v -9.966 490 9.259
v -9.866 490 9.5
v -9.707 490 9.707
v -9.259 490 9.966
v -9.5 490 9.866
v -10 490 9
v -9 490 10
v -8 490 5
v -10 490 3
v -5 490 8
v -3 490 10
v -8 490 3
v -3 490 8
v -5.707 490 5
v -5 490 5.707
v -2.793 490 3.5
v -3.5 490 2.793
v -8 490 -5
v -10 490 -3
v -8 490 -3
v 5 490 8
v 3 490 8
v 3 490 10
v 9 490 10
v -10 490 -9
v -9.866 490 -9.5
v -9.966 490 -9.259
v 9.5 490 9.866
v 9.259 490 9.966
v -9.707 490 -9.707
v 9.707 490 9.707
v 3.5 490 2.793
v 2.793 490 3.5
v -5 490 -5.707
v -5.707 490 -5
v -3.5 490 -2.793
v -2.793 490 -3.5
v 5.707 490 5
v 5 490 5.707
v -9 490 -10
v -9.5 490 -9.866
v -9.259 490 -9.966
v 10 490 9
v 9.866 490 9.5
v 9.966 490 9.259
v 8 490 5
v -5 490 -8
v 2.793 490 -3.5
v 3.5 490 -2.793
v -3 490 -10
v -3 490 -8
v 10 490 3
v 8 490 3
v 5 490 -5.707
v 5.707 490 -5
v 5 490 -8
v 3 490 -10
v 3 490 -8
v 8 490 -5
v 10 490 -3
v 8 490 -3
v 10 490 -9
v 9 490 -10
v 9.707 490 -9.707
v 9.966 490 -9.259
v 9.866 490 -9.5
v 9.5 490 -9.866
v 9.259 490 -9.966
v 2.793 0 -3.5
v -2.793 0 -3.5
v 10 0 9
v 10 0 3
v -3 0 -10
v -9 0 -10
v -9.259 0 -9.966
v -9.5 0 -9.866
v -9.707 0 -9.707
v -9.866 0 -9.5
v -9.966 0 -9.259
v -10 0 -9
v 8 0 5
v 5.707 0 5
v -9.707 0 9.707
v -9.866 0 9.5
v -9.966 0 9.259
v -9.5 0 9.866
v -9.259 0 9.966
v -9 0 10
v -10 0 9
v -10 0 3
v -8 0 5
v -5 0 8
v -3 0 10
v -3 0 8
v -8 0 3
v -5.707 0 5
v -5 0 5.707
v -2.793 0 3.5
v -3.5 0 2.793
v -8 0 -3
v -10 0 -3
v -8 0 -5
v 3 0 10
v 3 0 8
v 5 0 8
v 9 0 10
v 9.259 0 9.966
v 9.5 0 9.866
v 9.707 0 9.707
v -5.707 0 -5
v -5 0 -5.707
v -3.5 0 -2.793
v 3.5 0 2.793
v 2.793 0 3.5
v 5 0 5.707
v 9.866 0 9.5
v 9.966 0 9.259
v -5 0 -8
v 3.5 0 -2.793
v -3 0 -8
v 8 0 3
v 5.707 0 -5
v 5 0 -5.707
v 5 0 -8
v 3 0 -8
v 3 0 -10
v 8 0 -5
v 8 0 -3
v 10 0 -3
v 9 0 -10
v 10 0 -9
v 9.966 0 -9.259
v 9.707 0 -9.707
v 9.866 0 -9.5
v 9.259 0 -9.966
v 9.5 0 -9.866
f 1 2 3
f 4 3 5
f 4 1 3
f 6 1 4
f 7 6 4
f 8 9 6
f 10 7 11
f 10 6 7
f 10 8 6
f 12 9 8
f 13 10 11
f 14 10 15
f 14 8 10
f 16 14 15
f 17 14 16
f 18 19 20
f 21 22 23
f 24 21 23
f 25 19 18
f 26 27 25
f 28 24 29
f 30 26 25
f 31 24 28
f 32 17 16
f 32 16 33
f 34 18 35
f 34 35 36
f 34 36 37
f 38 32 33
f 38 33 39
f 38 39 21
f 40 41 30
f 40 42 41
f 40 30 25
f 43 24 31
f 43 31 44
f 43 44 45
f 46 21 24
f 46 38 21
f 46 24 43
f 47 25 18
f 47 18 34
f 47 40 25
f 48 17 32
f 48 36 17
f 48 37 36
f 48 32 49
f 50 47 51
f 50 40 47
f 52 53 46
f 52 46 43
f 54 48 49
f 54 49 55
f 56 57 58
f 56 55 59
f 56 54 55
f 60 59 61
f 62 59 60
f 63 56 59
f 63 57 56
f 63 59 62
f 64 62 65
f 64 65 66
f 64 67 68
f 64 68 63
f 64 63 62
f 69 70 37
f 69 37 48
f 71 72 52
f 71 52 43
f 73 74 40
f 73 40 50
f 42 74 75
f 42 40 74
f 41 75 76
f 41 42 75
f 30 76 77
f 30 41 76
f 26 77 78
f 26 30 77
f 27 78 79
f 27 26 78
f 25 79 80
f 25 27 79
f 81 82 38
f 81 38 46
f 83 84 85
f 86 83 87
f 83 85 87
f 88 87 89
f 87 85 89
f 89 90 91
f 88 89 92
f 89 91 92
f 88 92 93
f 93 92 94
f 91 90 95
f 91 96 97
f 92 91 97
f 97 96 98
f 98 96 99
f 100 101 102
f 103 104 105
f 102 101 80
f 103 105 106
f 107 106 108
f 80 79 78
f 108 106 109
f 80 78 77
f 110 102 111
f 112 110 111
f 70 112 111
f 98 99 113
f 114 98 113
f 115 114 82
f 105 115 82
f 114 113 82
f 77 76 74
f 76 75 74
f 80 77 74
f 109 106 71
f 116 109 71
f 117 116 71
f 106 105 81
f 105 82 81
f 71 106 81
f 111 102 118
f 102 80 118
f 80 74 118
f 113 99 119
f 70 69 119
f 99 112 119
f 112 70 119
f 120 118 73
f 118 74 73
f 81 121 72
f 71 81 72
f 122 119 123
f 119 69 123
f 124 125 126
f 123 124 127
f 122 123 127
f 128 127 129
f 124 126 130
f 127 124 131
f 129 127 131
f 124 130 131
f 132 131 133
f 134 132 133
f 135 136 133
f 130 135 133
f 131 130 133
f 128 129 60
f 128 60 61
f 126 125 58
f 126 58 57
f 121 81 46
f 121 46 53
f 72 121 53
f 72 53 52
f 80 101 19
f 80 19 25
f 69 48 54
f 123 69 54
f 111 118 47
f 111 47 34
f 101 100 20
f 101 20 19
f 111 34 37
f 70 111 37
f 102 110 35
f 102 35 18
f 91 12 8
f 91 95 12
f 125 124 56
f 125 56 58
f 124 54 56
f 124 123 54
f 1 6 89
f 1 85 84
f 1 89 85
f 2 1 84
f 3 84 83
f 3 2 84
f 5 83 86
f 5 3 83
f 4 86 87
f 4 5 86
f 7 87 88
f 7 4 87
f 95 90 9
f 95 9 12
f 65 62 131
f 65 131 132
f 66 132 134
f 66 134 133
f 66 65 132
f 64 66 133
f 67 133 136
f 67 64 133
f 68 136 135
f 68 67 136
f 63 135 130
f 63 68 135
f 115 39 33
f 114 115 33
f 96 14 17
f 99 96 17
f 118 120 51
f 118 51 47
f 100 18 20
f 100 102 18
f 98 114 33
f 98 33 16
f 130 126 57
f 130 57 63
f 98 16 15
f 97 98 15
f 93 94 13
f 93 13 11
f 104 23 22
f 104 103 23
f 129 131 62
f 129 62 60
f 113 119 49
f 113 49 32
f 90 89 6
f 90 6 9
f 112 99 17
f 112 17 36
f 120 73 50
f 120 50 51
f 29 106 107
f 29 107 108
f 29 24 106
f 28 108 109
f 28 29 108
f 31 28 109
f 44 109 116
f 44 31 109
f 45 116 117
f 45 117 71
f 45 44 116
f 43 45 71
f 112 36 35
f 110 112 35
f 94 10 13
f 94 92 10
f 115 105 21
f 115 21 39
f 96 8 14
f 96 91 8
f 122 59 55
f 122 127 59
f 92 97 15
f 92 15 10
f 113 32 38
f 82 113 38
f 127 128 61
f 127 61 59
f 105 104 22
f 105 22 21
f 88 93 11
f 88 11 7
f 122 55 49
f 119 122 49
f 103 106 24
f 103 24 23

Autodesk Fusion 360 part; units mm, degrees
sketch "Sketch1" plane through (0, 0, 0) normal (0, 1, 0) x (1, 0, 0)
  line L0 (3.5, 0) -> (3.5, -2.7929)
  line L1 (3.5, -2.7929) -> (5.7071, -5)
  line L2 (5.7071, -5) -> (8, -5)
  line L3 (10, -3) -> (10, -10)
  line L4 (0, 0) -> (10, -10)
  line L5 (3.5, 0) -> (0, 0)
  line L6 (8, -5) -> (8, -3)
  line L7 (8, -3) -> (10, -3)
  dimension "d4" = 45
  dimension "d5" = 0.5
  dimension "d7" = 7
  dimension "d8" = 2
  dimension "d9" = 2
  dimension "d10" = 3.5
  dimension "d11" = 10
extrude "Extrude1" add sketch "Sketch1" along normal blind 490
mirror "Mirror1" about plane through (0, 0, 0) normal (-0.707107, 0, 0.707107) of bodies 1 merged
mirror "Mirror2" about plane through (0, 0, 3.5) normal (-1, 0, 0) of bodies 1 merged
mirror "Mirror3" about plane through (3.5, 0, 0) normal (0, 0, -1) of bodies 1 merged
fillet "Fillet1" radius 1 4 edges at (-10, 245, 10) (10, 245, 10) (-10, 245, -10) (10, 245, -10)
sketch "Sketch2" plane through (0, 0, 0) normal (0, -1, 0) x (1, 0, 0)
  arc A0 (9, -10) -> (10, -9) centre (9, -9) ccw
  line L0 (10, -9) -> (10, -3)
  line L1 (10, -3) -> (8, -3)
  line L2 (8, -3) -> (8, -5)
  line L3 (8, -5) -> (5.7071, -5)
  line L4 (5.7071, -5) -> (3.5, -2.7929)
  line L5 (3.5, -2.7929) -> (3.5, 2.7929)
  line L6 (3.5, 2.7929) -> (5.7071, 5)
  line L7 (5.7071, 5) -> (8, 5)
  line L8 (8, 5) -> (8, 3)
  line L9 (8, 3) -> (10, 3)
  line L10 (10, 3) -> (10, 9)
  arc A1 (10, 9) -> (9, 10) centre (9, 9) ccw
  line L11 (9, 10) -> (3, 10)
  line L12 (3, 10) -> (3, 8)
  line L13 (3, 8) -> (5, 8)
  line L14 (5, 8) -> (5, 5.7071)
  line L15 (5, 5.7071) -> (2.7929, 3.5)
  line L16 (2.7929, 3.5) -> (-2.7929, 3.5)
  line L17 (-2.7929, 3.5) -> (-5, 5.7071)
  line L18 (-5, 5.7071) -> (-5, 8)
  line L19 (-5, 8) -> (-3, 8)
  line L20 (-3, 8) -> (-3, 10)
  line L21 (-3, 10) -> (-9, 10)
  arc A2 (-9, 10) -> (-10, 9) centre (-9, 9) ccw
  line L22 (-10, 9) -> (-10, 3)
  line L23 (-10, 3) -> (-8, 3)
  line L24 (-8, 3) -> (-8, 5)
  line L25 (-8, 5) -> (-5.7071, 5)
  line L26 (-5.7071, 5) -> (-3.5, 2.7929)
  line L27 (-3.5, 2.7929) -> (-3.5, -2.7929)
  line L28 (-3.5, -2.7929) -> (-5.7071, -5)
  line L29 (-5.7071, -5) -> (-8, -5)
  line L30 (-8, -5) -> (-8, -3)
  line L31 (-8, -3) -> (-10, -3)
  line L32 (-10, -3) -> (-10, -9)
  arc A3 (-10, -9) -> (-9, -10) centre (-9, -9) ccw
  line L33 (-9, -10) -> (-3, -10)
  line L34 (-3, -10) -> (-3, -8)
  line L35 (-3, -8) -> (-5, -8)
  line L36 (-5, -8) -> (-5, -5.7071)
  line L37 (-5, -5.7071) -> (-2.7929, -3.5)
  line L38 (-2.7929, -3.5) -> (2.7929, -3.5)
  line L39 (2.7929, -3.5) -> (5, -5.7071)
  line L40 (5, -5.7071) -> (5, -8)
  line L41 (5, -8) -> (3, -8)
  line L42 (3, -8) -> (3, -10)
  line L43 (3, -10) -> (9, -10)
  line L44 (2.9, 7.9) -> (4.9, 7.9)
  line L45 (4.9, 7.9) -> (4.9, 5.7485)
  line L46 (4.9, 5.7485) -> (2.7515, 3.6)
  line L47 (2.7515, 3.6) -> (-2.7515, 3.6)
  line L48 (-2.7515, 3.6) -> (-4.9, 5.7485)
  line L49 (-4.9, 5.7485) -> (-4.9, 7.9)
  line L50 (-4.9, 7.9) -> (-2.9, 7.9)
  line L51 (-2.9, 7.9) -> (-2.9, 10.1)
  line L52 (-2.9, 10.1) -> (-9, 10.1)
  arc A4 (-9, 10.1) -> (-10.1, 9) centre (-9, 9) ccw
  line L53 (-10.1, 9) -> (-10.1, 2.9)
  line L54 (-10.1, 2.9) -> (-7.9, 2.9)
  line L55 (-7.9, 2.9) -> (-7.9, 4.9)
  line L56 (-7.9, 4.9) -> (-5.7485, 4.9)
  line L57 (-5.7485, 4.9) -> (-3.6, 2.7515)
  line L58 (-3.6, 2.7515) -> (-3.6, -2.7515)
  line L59 (-3.6, -2.7515) -> (-5.7485, -4.9)
  line L60 (-5.7485, -4.9) -> (-7.9, -4.9)
  line L61 (-7.9, -4.9) -> (-7.9, -2.9)
  line L62 (-7.9, -2.9) -> (-10.1, -2.9)
  line L63 (-10.1, -2.9) -> (-10.1, -9)
  arc A5 (-10.1, -9) -> (-9, -10.1) centre (-9, -9) ccw
  line L64 (-9, -10.1) -> (-2.9, -10.1)
  line L65 (-2.9, -10.1) -> (-2.9, -7.9)
  line L66 (-2.9, -7.9) -> (-4.9, -7.9)
  line L67 (-4.9, -7.9) -> (-4.9, -5.7485)
  line L68 (-4.9, -5.7485) -> (-2.7515, -3.6)
  line L69 (-2.7515, -3.6) -> (2.7515, -3.6)
  line L70 (2.7515, -3.6) -> (4.9, -5.7485)
  line L71 (4.9, -5.7485) -> (4.9, -7.9)
  line L72 (4.9, -7.9) -> (2.9, -7.9)
  line L73 (2.9, -7.9) -> (2.9, -10.1)
  line L74 (2.9, -10.1) -> (9, -10.1)
  arc A6 (9, -10.1) -> (10.1, -9) centre (9, -9) ccw
  line L75 (10.1, -9) -> (10.1, -2.9)
  line L76 (10.1, -2.9) -> (7.9, -2.9)
  line L77 (7.9, -2.9) -> (7.9, -4.9)
  line L78 (7.9, -4.9) -> (5.7485, -4.9)
  line L79 (5.7485, -4.9) -> (3.6, -2.7515)
  line L80 (3.6, -2.7515) -> (3.6, 2.7515)
  line L81 (3.6, 2.7515) -> (5.7485, 4.9)
  line L82 (5.7485, 4.9) -> (7.9, 4.9)
  line L83 (7.9, 4.9) -> (7.9, 2.9)
  line L84 (7.9, 2.9) -> (10.1, 2.9)
  line L85 (10.1, 2.9) -> (10.1, 9)
  arc A7 (10.1, 9) -> (9, 10.1) centre (9, 9) ccw
  line L86 (9, 10.1) -> (2.9, 10.1)
  line L87 (2.9, 10.1) -> (2.9, 7.9)
  dimension "d22" = 0.1
sketch "Sketch3" plane through (0, 0, 0) normal (0, 1, 0) x (1, 0, 0)
  line L0 (10.1, 9) -> (10.1, 2.9)
  arc A0 (10.1, 9) -> (9, 10.1) centre (9, 9) ccw
  line L1 (2.9, 10.1) -> (9, 10.1)
  line L2 (2.9, 7.9) -> (2.9, 10.1)
  line L3 (4.9, 7.9) -> (2.9, 7.9)
  line L4 (4.9, 5.7485) -> (4.9, 7.9)
  line L5 (2.7515, 3.6) -> (4.9, 5.7485)
  line L6 (5.7485, 4.9) -> (3.6, 2.7515)
  line L7 (7.9, 4.9) -> (5.7485, 4.9)
  line L8 (7.9, 2.9) -> (7.9, 4.9)
  line L9 (10.1, 2.9) -> (7.9, 2.9)
  line L10 (3.6, 2.7515) -> (3.6, -2.7515)
  line L11 (3.6, -2.7515) -> (5.7485, -4.9)
  line L12 (5.7485, -4.9) -> (7.9, -4.9)
  line L13 (7.9, -4.9) -> (7.9, -2.9)
  line L14 (7.9, -2.9) -> (10.1, -2.9)
  line L15 (10.1, -2.9) -> (10.1, -9)
  arc A1 (9, -10.1) -> (10.1, -9) centre (9, -9) ccw
  line L16 (9, -10.1) -> (2.9, -10.1)
  line L17 (2.9, -10.1) -> (2.9, -7.9)
  line L18 (2.9, -7.9) -> (4.9, -7.9)
  line L19 (4.9, -7.9) -> (4.9, -5.7485)
  line L20 (4.9, -5.7485) -> (2.7515, -3.6)
  line L21 (2.7515, -3.6) -> (-2.7515, -3.6)
  line L22 (-2.7515, -3.6) -> (-4.9, -5.7485)
  line L23 (-4.9, -5.7485) -> (-4.9, -7.9)
  line L24 (-4.9, -7.9) -> (-2.9, -7.9)
  line L25 (-2.9, -7.9) -> (-2.9, -10.1)
  line L26 (-2.9, -10.1) -> (-9, -10.1)
  arc A2 (-10.1, -9) -> (-9, -10.1) centre (-9, -9) ccw
  line L27 (-10.1, -9) -> (-10.1, -2.9)
  line L28 (-10.1, -2.9) -> (-7.9, -2.9)
  line L29 (-7.9, -2.9) -> (-7.9, -4.9)
  line L30 (-7.9, -4.9) -> (-5.7485, -4.9)
  line L31 (-5.7485, -4.9) -> (-3.6, -2.7515)
  line L32 (-3.6, -2.7515) -> (-3.6, 2.7515)
  line L33 (-3.6, 2.7515) -> (-5.7485, 4.9)
  line L34 (-7.9, 2.9) -> (-10.1, 2.9)
  line L35 (-7.9, 4.9) -> (-7.9, 2.9)
  line L36 (-5.7485, 4.9) -> (-7.9, 4.9)
  line L37 (-10.1, 2.9) -> (-10.1, 9)
  line L38 (-4.9, 5.7485) -> (-2.7515, 3.6)
  line L39 (-2.7515, 3.6) -> (2.7515, 3.6)
  line L40 (-4.9, 7.9) -> (-4.9, 5.7485)
  line L41 (-2.9, 7.9) -> (-4.9, 7.9)
  line L42 (-2.9, 10.1) -> (-2.9, 7.9)
  line L43 (-9, 10.1) -> (-2.9, 10.1)
  arc A3 (-9, 10.1) -> (-10.1, 9) centre (-9, 9) ccw
